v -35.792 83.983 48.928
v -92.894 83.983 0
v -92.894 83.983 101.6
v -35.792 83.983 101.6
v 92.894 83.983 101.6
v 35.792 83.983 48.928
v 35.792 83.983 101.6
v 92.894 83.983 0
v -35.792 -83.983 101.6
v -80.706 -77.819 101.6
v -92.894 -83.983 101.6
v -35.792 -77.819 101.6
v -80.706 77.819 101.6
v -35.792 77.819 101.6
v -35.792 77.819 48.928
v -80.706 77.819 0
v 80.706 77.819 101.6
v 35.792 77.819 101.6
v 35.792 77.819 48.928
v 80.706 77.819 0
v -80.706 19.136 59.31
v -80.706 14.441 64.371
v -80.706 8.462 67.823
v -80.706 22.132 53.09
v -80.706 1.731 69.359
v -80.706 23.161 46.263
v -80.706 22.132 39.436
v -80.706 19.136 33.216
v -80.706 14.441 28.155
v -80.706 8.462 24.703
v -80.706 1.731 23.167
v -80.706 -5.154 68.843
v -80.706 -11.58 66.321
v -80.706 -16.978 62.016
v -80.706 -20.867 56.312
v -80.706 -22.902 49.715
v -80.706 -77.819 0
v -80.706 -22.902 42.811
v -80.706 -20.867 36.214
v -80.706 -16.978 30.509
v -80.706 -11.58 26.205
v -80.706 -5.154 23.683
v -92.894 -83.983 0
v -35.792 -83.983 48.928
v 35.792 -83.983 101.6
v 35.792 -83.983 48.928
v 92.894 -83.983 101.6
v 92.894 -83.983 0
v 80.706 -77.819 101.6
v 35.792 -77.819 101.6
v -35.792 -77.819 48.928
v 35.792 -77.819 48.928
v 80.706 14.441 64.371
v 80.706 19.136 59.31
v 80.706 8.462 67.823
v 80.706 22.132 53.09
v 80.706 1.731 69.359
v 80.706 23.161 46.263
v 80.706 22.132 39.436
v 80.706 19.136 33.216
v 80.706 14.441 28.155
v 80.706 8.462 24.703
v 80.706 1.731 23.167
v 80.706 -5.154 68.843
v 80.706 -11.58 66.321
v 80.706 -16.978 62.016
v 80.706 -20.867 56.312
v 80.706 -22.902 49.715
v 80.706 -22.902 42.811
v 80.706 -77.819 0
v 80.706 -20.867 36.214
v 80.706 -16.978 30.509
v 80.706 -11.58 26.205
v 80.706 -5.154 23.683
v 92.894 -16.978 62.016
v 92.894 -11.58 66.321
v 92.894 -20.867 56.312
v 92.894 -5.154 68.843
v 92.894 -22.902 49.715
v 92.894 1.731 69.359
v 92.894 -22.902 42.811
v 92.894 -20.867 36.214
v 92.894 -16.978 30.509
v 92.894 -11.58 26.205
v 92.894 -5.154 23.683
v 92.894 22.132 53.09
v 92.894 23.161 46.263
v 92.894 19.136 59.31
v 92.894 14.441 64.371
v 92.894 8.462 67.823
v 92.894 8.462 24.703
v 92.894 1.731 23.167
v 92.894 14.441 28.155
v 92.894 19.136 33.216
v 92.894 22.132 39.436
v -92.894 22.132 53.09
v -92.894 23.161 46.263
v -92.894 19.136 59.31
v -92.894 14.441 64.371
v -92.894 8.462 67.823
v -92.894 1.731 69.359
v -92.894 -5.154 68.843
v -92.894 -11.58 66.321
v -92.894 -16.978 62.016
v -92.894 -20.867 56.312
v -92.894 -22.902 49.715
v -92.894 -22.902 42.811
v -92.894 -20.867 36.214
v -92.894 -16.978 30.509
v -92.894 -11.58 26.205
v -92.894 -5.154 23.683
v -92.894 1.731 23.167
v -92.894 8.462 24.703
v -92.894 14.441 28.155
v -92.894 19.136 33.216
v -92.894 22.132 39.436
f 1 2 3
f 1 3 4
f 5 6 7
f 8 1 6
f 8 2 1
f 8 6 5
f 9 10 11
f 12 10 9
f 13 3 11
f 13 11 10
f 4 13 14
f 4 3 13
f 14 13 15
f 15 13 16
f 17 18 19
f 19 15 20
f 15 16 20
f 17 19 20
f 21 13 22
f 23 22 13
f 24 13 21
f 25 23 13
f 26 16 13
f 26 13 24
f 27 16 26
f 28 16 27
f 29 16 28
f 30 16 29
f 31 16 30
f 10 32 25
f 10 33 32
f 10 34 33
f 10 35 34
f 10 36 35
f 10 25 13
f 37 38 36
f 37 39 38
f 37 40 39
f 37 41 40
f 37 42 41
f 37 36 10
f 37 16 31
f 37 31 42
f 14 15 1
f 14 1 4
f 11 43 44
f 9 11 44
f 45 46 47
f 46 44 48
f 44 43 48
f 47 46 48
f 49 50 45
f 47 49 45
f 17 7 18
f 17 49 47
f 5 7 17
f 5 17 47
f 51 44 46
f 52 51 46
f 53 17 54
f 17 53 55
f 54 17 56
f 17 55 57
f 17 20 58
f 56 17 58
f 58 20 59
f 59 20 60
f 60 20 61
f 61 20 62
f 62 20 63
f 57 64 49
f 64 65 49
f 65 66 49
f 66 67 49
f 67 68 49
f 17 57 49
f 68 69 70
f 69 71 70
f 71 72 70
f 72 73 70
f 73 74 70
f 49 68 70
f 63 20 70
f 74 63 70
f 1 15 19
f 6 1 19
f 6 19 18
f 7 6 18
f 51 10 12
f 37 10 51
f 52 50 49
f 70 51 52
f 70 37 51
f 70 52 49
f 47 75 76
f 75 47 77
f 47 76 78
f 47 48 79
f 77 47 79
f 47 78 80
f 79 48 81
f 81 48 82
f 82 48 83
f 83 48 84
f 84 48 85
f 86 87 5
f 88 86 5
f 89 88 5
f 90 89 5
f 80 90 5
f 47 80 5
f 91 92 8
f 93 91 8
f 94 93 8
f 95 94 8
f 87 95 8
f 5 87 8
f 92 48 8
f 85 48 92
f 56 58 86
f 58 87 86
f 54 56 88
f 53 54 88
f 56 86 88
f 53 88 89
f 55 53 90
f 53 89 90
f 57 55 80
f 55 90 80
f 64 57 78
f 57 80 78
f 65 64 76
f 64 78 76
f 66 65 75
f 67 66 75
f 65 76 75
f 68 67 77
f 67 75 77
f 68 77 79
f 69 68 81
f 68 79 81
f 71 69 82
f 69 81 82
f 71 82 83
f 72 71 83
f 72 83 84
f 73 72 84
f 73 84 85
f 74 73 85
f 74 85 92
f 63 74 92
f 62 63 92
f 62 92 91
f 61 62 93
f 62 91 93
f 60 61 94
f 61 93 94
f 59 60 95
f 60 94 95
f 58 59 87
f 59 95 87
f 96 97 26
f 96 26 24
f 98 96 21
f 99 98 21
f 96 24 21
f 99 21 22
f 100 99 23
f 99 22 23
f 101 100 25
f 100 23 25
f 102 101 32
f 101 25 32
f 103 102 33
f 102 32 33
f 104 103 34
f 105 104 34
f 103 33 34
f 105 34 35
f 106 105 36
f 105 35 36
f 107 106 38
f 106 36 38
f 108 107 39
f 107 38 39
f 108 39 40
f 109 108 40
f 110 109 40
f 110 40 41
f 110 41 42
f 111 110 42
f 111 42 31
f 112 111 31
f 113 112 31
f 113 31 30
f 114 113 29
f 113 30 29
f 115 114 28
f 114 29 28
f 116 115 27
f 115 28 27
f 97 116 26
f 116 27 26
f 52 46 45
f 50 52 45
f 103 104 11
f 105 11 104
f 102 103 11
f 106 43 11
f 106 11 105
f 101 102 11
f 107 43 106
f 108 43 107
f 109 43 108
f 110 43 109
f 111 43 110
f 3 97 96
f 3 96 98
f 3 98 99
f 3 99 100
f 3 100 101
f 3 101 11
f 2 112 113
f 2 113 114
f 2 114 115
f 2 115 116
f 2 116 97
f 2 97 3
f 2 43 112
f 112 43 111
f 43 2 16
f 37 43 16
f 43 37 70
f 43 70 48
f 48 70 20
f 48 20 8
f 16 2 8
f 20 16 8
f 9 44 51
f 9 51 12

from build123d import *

# Parameters (mm, degrees)
F0_W     = 185.788676
F0_H     = 167.966946
F1_DEPTH = 101.6
F2_W     = 71.583546
F2_H     = 55.591479
F3_DEPTH = 635
F4_W     = 161.412612
F4_H     = 155.637712
F5_DEPTH = 1270
F6_R     = 23.160944
F7_DEPTH = 635


with BuildPart() as f1:
    # F0 (on Top) → F1 (new body)
    with BuildSketch(Plane.XY):
        Rectangle(F0_W, F0_H)
    extrude(amount=F1_DEPTH)

    # F2 (on Front) → F3 (cut, symmetric)
    with BuildSketch(Plane.XZ):
        with Locations((0, 76.723866)):
            Rectangle(F2_W, F2_H)
    extrude(amount=F3_DEPTH, both=True, mode=Mode.SUBTRACT)

    # F4 (on face) → F5 (cut)
    with BuildSketch(Plane(origin=(0, 0, 0), x_dir=(1, 0, 0), z_dir=(0, 0, -1))):
        Rectangle(F4_W, F4_H)
    extrude(amount=-F5_DEPTH, mode=Mode.SUBTRACT)

    # F6 (on Right) → F7 (cut, symmetric)
    with BuildSketch(Plane.YZ):
        with Locations((0, 46.262771)):
            Circle(F6_R)
    extrude(amount=F7_DEPTH, both=True, mode=Mode.SUBTRACT)


solid = f1.part
